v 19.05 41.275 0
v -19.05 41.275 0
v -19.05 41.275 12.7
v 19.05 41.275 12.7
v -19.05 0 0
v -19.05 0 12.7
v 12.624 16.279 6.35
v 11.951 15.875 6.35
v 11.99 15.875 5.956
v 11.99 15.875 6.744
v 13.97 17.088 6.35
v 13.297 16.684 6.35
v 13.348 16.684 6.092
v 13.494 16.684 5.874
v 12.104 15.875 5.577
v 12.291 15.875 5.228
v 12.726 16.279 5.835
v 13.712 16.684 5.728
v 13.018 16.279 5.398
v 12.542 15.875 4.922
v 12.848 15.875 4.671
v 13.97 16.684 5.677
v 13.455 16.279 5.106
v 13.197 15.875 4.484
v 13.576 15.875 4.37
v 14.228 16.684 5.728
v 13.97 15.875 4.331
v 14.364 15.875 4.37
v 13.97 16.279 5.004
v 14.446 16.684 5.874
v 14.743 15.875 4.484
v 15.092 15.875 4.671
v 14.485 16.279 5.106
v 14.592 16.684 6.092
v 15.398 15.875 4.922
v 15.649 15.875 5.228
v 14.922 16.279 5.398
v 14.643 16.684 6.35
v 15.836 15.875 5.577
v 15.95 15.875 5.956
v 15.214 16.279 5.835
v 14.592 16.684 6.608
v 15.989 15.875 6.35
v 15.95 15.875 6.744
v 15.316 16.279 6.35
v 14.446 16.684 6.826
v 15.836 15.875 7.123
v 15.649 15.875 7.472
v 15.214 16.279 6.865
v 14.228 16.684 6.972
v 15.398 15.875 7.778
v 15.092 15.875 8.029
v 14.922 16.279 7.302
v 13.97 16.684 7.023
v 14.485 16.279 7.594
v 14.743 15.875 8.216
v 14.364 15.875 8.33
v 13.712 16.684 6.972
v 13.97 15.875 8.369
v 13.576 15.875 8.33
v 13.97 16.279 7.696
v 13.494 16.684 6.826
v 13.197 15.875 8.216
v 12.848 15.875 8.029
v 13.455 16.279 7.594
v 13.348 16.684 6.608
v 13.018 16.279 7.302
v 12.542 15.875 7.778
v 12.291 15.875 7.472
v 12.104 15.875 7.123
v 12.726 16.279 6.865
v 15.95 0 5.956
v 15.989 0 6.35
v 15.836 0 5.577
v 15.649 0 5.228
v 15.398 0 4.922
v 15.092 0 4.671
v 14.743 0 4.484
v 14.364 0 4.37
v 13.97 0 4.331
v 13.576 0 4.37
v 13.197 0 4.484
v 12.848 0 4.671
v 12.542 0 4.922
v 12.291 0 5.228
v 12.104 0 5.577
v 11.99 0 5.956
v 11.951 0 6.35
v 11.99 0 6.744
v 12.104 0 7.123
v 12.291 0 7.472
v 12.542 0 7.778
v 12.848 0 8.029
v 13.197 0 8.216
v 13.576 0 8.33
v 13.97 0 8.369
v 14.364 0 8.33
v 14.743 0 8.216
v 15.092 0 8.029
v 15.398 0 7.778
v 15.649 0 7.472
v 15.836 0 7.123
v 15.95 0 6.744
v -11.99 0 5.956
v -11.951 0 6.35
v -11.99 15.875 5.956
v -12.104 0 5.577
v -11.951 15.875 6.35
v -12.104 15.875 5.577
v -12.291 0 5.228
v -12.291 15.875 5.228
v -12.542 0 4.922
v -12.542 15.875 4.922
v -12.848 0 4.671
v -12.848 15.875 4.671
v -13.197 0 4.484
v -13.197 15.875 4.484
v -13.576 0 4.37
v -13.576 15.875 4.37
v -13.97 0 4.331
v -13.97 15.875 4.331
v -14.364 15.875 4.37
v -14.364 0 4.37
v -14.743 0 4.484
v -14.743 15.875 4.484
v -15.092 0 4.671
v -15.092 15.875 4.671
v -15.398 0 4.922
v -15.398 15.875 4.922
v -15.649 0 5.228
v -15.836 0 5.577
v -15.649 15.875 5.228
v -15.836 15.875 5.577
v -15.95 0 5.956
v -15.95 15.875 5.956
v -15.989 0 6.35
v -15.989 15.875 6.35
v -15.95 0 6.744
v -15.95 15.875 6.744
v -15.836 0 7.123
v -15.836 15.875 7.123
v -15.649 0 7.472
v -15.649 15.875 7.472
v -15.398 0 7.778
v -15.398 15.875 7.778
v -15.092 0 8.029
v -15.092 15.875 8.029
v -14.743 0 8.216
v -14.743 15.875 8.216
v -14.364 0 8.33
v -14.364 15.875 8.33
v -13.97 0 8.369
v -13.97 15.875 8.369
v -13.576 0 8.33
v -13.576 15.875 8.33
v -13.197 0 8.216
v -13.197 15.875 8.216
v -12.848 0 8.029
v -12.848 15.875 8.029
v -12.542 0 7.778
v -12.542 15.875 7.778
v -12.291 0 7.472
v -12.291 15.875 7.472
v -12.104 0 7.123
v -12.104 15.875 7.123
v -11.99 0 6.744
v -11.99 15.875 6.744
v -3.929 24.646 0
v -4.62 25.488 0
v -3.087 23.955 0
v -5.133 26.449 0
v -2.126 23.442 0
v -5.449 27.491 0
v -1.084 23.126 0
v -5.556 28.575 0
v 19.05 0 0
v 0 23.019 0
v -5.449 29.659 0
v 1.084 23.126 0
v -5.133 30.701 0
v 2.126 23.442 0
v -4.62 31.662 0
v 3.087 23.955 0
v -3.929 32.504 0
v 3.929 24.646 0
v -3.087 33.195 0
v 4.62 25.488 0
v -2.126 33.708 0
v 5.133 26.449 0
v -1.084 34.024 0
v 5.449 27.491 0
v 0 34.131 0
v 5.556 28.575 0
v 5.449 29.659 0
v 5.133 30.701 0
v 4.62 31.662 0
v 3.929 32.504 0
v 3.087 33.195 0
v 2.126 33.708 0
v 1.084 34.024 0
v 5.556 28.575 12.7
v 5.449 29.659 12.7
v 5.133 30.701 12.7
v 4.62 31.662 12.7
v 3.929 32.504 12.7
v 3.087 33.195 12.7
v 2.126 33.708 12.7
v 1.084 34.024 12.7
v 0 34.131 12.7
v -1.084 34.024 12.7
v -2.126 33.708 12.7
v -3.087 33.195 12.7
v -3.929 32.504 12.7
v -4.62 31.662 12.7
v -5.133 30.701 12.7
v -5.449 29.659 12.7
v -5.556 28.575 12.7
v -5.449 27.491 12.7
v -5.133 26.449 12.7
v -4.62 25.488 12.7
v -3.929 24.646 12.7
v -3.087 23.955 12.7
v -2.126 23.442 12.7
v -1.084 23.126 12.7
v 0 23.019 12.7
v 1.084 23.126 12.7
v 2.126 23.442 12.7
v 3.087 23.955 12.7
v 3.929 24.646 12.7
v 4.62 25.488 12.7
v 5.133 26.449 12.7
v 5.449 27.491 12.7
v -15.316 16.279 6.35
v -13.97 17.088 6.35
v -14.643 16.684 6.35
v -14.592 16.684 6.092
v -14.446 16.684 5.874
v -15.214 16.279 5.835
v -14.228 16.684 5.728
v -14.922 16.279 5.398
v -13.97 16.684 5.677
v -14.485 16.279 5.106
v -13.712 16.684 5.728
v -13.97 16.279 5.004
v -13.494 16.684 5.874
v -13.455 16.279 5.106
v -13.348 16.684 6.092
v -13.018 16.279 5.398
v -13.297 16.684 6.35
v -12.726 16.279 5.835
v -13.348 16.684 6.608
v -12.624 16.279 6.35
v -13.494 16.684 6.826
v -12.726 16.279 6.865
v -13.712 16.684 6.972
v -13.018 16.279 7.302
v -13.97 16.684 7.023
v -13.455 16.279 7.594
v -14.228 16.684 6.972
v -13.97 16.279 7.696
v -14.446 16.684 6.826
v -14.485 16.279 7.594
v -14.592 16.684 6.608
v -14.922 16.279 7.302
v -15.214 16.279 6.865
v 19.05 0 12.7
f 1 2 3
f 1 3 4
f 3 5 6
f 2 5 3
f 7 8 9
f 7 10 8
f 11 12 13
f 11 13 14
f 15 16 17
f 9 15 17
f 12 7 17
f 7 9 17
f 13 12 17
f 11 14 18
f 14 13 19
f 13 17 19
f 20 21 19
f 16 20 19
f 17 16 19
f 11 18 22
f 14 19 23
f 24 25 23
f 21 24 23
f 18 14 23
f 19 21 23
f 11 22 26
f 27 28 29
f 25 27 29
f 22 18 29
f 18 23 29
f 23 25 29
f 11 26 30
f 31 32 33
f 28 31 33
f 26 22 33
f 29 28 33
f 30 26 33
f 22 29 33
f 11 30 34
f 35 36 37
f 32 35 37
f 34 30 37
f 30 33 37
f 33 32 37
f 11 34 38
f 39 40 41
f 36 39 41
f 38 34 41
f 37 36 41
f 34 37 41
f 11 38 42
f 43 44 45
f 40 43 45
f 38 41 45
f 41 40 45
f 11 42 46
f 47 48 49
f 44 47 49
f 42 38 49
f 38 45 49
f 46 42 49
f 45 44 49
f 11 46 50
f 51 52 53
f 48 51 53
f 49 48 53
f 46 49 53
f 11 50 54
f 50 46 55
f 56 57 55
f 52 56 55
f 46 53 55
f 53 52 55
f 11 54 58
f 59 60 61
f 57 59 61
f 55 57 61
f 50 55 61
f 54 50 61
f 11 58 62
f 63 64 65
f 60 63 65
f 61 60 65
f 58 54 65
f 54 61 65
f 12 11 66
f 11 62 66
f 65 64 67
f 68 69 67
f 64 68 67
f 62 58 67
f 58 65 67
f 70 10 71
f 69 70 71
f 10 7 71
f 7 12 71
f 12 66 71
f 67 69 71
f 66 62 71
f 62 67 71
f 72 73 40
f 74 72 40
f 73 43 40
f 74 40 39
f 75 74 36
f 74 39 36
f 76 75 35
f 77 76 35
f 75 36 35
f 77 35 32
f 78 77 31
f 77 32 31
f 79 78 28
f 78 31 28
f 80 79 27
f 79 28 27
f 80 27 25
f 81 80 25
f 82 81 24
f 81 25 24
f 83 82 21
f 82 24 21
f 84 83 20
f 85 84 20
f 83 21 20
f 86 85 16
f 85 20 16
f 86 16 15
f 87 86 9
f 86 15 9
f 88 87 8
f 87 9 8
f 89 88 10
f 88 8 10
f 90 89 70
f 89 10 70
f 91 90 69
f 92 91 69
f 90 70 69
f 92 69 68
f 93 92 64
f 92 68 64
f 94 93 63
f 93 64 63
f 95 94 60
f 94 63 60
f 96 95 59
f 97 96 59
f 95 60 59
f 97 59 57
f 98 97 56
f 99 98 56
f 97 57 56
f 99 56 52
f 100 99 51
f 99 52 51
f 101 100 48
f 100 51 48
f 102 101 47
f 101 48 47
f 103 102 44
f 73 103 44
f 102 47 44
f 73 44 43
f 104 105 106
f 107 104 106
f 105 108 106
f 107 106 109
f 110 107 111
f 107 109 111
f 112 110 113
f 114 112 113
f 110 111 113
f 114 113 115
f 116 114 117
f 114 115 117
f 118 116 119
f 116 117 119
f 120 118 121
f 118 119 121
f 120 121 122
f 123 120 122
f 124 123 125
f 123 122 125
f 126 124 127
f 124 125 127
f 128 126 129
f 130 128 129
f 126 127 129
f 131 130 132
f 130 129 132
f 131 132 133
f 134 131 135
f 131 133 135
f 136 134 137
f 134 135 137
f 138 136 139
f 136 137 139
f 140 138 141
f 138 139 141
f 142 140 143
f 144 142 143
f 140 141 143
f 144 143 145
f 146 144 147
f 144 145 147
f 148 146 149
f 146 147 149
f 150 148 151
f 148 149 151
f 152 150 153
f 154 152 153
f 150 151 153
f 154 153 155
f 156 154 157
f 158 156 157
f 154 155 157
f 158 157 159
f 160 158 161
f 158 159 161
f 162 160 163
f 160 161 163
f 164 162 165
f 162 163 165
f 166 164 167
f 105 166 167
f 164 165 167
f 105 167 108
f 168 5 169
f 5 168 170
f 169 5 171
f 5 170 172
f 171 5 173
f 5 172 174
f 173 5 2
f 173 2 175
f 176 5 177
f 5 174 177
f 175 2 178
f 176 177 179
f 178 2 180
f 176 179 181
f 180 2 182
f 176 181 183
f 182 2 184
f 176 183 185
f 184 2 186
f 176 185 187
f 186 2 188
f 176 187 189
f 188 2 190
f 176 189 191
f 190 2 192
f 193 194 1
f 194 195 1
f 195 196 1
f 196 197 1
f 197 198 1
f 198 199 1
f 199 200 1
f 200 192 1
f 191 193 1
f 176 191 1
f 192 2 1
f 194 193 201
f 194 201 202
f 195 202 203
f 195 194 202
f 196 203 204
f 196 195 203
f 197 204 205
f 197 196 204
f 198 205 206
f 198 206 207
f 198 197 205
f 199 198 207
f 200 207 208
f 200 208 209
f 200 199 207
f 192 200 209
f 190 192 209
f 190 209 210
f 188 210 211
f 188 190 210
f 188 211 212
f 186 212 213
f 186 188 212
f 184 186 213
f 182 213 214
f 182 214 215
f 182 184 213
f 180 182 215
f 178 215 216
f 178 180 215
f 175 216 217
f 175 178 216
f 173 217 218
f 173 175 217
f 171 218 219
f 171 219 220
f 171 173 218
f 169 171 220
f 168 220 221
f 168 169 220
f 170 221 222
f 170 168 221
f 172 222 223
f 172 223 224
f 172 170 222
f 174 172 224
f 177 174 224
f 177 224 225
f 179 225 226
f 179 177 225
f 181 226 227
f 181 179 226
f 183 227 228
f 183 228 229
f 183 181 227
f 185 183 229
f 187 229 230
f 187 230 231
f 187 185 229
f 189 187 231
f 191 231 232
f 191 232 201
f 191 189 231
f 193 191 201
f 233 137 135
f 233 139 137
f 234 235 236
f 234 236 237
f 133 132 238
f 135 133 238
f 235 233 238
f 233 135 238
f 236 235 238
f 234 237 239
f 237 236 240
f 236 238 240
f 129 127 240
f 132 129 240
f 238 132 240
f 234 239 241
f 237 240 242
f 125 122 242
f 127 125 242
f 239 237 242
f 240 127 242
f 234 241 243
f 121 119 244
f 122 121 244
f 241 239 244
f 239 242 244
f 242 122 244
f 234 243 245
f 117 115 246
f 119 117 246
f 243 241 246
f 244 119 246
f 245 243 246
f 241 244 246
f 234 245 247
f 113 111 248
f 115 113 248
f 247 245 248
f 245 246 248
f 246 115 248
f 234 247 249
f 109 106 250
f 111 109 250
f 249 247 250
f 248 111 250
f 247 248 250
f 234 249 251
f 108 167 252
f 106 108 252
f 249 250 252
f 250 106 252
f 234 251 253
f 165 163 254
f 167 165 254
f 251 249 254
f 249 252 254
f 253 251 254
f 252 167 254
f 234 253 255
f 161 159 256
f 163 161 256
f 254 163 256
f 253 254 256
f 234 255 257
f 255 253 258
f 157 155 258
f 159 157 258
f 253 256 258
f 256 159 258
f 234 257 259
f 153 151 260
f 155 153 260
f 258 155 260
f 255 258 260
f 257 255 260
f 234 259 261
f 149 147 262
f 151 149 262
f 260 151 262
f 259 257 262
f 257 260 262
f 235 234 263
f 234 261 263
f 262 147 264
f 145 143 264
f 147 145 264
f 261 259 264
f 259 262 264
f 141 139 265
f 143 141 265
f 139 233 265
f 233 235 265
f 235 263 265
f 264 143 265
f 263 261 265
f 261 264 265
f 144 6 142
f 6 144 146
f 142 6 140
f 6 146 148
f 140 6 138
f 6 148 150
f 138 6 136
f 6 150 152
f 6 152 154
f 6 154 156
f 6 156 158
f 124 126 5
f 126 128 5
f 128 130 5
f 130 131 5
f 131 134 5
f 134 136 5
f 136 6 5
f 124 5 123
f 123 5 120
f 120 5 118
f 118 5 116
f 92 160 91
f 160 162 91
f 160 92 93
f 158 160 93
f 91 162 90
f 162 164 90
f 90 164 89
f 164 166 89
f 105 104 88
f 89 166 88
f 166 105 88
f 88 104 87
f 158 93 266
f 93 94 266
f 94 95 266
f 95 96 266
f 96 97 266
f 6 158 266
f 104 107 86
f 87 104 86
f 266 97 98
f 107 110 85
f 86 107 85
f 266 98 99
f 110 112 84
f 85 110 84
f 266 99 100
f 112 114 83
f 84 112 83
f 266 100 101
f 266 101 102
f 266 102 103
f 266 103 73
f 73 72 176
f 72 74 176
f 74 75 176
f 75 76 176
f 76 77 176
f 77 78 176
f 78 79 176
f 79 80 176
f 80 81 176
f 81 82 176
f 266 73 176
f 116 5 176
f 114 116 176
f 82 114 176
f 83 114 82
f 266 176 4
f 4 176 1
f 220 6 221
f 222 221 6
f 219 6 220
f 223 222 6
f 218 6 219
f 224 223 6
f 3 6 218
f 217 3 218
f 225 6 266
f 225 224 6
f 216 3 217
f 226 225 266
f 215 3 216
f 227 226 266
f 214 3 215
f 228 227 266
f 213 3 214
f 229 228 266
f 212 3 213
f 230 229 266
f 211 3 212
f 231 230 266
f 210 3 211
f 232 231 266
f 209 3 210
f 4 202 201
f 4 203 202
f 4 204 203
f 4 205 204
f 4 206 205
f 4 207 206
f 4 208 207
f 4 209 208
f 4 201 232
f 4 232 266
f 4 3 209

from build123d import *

# Parameters (mm, degrees)
SKETCH1_W                  = 38.1
SKETCH1_H                  = 41.275
SKETCH1_R                  = 5.55625
BOSS_EXTRUDE1_DEPTH        = 12.7
F_10_32_TAPPED_HOLE1_D     = 4.0386
F_10_32_TAPPED_HOLE1_DEPTH = 15.875
F_10_32_TAPPED_HOLE1_TIP   = 1.213317848


with BuildPart() as part:
    # Sketch1 → Boss-Extrude1 (new body)
    with BuildSketch(Plane.XY):
        with Locations((0, 20.6375)):
            Rectangle(SKETCH1_W, SKETCH1_H)
        with Locations((0, 28.575)):
            Circle(SKETCH1_R, mode=Mode.SUBTRACT)
    extrude(amount=BOSS_EXTRUDE1_DEPTH)

    # #10-32 Tapped Hole1
    with Locations(Plane(origin=(0, 0, 0), x_dir=(-1, 0, 0), z_dir=(0, -1, 0))):
        with Locations((-13.97, -6.35), (13.97, -6.35)):
            Hole(F_10_32_TAPPED_HOLE1_D / 2, depth=F_10_32_TAPPED_HOLE1_DEPTH)
            with Locations((0, 0, -(F_10_32_TAPPED_HOLE1_DEPTH + F_10_32_TAPPED_HOLE1_TIP / 2))):  # 118° drill point
                Cone(0, F_10_32_TAPPED_HOLE1_D / 2, F_10_32_TAPPED_HOLE1_TIP, mode=Mode.SUBTRACT)


solid = part.part
